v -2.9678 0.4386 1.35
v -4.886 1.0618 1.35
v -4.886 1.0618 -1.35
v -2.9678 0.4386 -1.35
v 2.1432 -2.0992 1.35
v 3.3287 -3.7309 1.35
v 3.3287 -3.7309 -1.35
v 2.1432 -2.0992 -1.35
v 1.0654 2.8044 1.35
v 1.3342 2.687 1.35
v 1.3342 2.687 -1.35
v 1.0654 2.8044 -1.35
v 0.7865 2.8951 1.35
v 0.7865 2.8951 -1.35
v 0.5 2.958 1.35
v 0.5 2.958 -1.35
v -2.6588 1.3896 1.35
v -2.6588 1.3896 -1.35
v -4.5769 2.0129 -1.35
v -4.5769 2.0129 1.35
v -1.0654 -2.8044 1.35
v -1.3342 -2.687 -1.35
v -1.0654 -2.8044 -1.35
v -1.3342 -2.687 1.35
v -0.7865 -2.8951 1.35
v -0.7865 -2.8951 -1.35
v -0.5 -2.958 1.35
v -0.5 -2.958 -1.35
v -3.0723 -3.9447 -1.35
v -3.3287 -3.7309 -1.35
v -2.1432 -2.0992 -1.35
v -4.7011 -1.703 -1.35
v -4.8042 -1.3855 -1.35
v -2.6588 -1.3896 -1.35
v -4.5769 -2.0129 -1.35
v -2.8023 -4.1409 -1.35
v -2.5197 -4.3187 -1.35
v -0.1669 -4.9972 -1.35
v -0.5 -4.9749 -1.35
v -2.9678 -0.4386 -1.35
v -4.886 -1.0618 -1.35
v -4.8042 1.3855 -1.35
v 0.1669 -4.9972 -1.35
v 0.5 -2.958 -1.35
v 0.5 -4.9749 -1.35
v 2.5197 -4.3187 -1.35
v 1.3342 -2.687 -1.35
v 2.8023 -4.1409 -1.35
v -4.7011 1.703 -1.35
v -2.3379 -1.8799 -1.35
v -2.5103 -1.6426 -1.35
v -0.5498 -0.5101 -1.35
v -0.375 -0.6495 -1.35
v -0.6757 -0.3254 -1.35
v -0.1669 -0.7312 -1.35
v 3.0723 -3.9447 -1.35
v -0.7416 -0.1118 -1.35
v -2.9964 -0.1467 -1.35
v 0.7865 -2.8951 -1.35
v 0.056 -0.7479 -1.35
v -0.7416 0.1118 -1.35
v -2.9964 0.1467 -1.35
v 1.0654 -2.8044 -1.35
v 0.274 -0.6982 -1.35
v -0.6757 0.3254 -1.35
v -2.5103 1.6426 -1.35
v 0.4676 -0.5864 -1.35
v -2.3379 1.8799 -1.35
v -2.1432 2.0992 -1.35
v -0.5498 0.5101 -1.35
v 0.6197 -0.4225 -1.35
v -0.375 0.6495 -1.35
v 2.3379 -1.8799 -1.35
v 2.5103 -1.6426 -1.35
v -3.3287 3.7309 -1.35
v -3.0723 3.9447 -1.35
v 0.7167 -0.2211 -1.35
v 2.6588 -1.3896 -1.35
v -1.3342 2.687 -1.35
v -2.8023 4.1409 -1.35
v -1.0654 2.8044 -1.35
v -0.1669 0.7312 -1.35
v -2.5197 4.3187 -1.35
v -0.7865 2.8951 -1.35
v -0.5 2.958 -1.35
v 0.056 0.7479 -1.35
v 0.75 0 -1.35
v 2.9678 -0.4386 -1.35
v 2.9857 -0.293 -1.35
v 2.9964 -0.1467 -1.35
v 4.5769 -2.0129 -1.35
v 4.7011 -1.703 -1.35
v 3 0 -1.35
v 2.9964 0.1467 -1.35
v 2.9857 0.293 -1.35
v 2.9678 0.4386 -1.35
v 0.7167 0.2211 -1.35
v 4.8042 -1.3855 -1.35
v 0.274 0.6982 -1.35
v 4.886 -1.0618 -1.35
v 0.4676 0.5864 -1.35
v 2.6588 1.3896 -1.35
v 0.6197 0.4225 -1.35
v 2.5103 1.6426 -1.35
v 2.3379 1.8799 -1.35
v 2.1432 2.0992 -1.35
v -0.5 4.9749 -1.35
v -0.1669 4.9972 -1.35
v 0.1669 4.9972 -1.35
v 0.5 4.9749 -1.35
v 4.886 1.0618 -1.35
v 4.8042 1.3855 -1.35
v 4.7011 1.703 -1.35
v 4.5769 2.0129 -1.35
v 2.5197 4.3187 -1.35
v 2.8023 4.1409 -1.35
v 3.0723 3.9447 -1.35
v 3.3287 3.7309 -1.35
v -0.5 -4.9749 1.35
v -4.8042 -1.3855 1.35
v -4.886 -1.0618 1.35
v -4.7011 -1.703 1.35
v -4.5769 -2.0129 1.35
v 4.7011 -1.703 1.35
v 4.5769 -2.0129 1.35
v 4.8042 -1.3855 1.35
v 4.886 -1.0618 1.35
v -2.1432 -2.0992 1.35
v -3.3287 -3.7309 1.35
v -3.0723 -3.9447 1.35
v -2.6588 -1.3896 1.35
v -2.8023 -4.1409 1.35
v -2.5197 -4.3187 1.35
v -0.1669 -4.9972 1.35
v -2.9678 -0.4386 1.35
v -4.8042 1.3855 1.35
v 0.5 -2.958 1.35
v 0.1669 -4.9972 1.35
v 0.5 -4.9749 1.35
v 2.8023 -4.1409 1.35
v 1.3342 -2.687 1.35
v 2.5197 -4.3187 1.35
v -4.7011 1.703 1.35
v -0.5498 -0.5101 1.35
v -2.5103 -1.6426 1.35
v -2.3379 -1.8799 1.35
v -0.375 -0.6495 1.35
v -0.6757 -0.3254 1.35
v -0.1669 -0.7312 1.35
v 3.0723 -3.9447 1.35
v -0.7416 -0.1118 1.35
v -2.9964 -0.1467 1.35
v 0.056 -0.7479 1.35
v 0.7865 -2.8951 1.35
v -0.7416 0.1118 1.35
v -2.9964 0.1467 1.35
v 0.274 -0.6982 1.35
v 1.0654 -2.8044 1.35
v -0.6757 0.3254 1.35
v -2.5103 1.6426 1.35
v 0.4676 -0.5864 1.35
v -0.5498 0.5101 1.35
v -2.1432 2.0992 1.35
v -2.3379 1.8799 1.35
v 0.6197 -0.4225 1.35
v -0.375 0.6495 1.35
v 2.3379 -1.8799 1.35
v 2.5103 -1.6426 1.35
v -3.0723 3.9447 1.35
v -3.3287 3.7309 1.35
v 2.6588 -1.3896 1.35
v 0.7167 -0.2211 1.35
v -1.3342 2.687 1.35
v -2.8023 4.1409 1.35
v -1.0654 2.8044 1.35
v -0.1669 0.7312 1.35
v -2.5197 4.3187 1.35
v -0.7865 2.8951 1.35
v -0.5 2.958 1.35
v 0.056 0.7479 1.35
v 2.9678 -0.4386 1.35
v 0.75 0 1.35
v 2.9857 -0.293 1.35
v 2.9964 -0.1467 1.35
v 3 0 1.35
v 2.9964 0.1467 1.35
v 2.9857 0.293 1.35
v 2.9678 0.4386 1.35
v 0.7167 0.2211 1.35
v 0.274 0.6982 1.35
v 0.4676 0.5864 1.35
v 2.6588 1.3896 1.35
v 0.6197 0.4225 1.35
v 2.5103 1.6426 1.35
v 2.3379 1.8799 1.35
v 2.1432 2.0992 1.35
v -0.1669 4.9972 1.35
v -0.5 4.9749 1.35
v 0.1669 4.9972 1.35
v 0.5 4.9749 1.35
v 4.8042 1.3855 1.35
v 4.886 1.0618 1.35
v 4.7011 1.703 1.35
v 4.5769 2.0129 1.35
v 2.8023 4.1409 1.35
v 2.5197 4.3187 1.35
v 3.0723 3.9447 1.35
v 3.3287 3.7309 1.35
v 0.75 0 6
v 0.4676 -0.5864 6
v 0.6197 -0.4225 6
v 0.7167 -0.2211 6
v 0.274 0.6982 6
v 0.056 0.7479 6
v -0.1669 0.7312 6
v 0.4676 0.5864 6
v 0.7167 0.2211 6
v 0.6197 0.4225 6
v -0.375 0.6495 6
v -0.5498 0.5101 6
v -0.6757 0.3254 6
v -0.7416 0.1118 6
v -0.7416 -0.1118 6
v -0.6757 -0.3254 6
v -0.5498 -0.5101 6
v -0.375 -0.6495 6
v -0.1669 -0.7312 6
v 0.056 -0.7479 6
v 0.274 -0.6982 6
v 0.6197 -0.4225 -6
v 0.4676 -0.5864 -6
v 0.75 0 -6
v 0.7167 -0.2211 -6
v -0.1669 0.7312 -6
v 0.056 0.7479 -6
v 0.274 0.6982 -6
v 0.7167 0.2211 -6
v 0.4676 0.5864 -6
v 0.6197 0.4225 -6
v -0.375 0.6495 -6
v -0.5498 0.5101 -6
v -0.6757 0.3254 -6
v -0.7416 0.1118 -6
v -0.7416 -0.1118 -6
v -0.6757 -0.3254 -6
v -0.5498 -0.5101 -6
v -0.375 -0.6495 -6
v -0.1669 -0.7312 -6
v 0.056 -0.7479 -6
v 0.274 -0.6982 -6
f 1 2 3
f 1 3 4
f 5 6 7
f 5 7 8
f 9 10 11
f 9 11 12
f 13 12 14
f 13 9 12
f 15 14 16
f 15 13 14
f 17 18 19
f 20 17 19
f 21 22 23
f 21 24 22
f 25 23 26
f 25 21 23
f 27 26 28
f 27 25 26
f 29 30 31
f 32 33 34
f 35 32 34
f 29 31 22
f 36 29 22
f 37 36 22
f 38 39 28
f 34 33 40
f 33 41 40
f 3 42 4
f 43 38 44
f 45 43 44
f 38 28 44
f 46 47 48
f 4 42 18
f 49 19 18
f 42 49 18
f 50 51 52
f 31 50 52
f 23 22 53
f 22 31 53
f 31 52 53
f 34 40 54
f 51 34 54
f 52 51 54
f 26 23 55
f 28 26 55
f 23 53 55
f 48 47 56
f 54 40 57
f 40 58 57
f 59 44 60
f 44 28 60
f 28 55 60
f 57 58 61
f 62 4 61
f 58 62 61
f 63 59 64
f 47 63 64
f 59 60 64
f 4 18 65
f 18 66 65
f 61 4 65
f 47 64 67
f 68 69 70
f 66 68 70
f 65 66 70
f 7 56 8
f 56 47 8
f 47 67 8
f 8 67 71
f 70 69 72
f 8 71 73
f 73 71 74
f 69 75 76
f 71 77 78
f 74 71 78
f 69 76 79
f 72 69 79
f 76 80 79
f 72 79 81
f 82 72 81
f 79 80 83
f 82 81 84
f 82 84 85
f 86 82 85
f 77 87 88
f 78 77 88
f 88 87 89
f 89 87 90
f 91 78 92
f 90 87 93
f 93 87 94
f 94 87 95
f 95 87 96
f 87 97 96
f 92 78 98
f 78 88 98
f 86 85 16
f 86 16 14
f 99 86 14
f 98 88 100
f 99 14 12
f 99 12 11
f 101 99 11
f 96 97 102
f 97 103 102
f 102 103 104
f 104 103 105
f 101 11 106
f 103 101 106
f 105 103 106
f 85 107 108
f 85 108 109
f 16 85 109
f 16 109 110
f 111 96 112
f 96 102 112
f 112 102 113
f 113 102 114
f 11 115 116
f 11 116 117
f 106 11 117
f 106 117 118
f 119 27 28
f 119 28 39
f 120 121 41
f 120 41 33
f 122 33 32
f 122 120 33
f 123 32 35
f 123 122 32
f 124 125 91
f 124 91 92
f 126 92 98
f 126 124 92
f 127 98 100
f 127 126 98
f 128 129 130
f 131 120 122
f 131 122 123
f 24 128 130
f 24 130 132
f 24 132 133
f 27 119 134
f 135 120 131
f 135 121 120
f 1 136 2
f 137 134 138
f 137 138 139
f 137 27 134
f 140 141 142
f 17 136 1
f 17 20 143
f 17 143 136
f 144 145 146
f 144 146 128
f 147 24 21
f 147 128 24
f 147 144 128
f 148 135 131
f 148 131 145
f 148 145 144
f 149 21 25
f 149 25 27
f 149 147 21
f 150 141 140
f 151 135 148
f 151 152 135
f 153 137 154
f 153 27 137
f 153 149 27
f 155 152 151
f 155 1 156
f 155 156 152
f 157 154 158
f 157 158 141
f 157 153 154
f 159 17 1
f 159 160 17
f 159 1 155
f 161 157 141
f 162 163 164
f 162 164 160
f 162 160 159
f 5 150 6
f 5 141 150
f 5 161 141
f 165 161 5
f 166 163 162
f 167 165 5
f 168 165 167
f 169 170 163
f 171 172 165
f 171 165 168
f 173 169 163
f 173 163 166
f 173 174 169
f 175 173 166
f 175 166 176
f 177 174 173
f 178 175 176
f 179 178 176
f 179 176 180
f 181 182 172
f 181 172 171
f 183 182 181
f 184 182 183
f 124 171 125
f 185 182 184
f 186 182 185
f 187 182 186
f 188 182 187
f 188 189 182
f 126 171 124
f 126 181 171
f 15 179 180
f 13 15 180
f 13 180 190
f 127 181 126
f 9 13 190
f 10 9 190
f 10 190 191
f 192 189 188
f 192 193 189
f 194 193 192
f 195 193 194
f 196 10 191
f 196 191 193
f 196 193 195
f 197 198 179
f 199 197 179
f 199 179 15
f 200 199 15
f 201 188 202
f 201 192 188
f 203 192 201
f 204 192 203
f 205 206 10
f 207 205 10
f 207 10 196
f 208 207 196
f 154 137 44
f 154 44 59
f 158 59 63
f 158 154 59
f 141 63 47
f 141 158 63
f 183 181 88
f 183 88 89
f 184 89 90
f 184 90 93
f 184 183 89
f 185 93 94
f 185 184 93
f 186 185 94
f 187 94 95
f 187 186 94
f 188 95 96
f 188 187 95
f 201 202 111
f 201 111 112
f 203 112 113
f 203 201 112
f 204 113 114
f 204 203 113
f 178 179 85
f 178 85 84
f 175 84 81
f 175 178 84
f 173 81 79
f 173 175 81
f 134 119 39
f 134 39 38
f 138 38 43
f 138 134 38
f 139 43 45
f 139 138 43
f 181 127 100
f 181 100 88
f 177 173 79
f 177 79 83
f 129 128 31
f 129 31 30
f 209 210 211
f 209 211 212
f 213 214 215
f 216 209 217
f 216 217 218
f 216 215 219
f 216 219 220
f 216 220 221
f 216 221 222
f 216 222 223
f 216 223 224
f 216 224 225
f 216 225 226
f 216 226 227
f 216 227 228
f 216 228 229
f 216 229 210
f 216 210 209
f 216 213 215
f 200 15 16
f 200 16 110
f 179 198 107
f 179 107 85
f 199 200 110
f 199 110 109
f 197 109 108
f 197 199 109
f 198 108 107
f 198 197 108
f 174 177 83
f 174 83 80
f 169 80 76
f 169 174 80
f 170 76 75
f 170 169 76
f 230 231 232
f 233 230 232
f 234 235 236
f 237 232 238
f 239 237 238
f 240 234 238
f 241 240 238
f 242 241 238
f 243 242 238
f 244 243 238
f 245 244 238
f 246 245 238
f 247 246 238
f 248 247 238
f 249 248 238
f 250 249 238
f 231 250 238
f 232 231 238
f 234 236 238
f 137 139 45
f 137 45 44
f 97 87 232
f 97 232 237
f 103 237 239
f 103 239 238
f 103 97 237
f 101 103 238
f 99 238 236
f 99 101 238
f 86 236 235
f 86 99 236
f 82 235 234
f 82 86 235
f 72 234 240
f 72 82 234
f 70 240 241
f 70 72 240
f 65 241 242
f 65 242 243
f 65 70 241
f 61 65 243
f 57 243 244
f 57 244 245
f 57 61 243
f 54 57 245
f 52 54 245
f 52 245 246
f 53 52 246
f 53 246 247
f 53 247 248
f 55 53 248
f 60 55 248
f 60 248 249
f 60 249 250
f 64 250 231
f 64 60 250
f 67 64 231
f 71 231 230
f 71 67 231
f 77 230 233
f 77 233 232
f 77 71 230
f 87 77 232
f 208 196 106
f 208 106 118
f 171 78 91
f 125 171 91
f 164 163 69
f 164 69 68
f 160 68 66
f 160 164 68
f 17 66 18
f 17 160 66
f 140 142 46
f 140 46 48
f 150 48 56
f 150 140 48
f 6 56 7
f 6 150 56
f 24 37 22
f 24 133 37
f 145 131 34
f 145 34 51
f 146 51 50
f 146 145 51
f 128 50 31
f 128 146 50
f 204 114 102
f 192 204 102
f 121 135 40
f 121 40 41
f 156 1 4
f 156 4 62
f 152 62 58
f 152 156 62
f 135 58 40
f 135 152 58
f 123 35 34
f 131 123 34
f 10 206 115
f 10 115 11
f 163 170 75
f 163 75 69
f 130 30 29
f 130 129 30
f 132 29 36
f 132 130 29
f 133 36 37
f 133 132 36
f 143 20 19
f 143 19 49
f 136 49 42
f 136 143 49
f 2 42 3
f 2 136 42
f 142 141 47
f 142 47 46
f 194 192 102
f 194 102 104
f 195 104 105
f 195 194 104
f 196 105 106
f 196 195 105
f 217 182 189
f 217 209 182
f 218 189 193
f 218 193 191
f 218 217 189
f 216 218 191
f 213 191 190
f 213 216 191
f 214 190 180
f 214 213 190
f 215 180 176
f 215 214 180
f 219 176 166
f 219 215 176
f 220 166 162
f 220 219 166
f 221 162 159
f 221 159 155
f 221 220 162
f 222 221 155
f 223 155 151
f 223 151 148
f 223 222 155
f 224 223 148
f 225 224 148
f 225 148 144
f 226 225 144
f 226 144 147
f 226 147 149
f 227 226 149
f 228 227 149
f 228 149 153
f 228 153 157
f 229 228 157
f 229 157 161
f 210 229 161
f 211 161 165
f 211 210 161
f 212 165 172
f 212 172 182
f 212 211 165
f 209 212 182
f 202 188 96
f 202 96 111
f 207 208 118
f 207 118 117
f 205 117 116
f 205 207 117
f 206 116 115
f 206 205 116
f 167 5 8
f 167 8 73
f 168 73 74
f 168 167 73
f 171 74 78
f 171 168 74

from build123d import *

# Parameters (mm, degrees)
F1_DEPTH = 1.35
F2_R     = 0.75
F3_DEPTH = 6


with BuildPart() as f1:
    # F0 (on Top) → F1 (new body, symmetric)
    with BuildSketch(Plane.XY):
        with BuildLine():
            ThreePointArc((-2.9677716115, -0.4385563384), (-2.8531695489, -0.9270509831), (-2.6587546171, -1.3896128547))
            Line((-2.6587546171, -1.3896128547), (-1.3090169944, -0.9510565163))
            Line((-1.3090169944, -0.9510565163), (-0.8090169944, -0.2628655561))
            Line((-0.8090169944, -0.2628655561), (-1.6180339887, 0))
            Line((-1.6180339887, 0), (-2.9677716115, -0.4385563384))
        make_face()
        with BuildLine():
            ThreePointArc((2.1432007211, -2.0992119162), (2.4270509831, -1.7633557569), (2.6587546171, -1.3896128547))
            Line((2.6587546171, -1.3896128547), (1.3090169944, -0.9510565163))
            Line((1.3090169944, -0.9510565163), (2.1432007211, -2.0992119162))
        make_face()
        with BuildLine():
            ThreePointArc((-2.1432007211, -2.0992119162), (-1.7633557569, -2.4270509831), (-1.3341837268, -2.6869971684))
            Line((-1.3341837268, -2.6869971684), (-0.5, -1.5388417686))
            Line((-0.5, -1.5388417686), (-0.5, -0.6881909602))
            Line((-0.5, -0.6881909602), (-1.3090169944, -0.9510565163))
            Line((-1.3090169944, -0.9510565163), (-2.1432007211, -2.0992119162))
        make_face()
        Polygon((0.6180339887, 0), (0.8090169944, 0.2628655561), (0.5, 0.363271264), (0.5, 0.1624598481), align=None)
        with BuildLine():
            ThreePointArc((0.5, -2.9580398915), (0.9270509831, -2.8531695489), (1.3341837268, -2.6869971684))
            Line((1.3341837268, -2.6869971684), (0.5, -1.5388417686))
            Line((0.5, -1.5388417686), (0.5, -2.9580398915))
        make_face()
        with BuildLine():
            ThreePointArc((0.4045084972, -0.2938926261), (0.4755282581, -0.1545084972), (0.5, 0))
            Line((0.5, 0), (-0.5, 0))
            ThreePointArc((-0.5, 0), (-0.4755282581, -0.1545084972), (-0.4045084972, -0.2938926261))
            ThreePointArc((-0.4045084972, -0.2938926261), (-0.2938926261, -0.4045084972), (-0.1545084972, -0.4755282581))
            ThreePointArc((-0.1545084972, -0.4755282581), (0, -0.5), (0.1545084972, -0.4755282581))
            ThreePointArc((0.1545084972, -0.4755282581), (0.2938926261, -0.4045084972), (0.4045084972, -0.2938926261))
        make_face()
        Polygon((-0.6180339887, 0), (-0.5, 0.1624598481), (-0.5, 0.363271264), (-0.8090169944, 0.2628655561), align=None)
        Polygon((0.5, -0.6881909602), (0.5, -0.363271264), (0.3090169944, -0.4253254042), (0.1909830056, -0.5877852523), align=None)
        with BuildLine():
            Line((-0.5, 1.5388417686), (-0.5, 2.9580398915))
            ThreePointArc((-0.5, 2.9580398915), (-0.9270509831, 2.8531695489), (-1.3341837268, 2.6869971684))
            Line((-1.3341837268, 2.6869971684), (-0.5, 1.5388417686))
        make_face()
        with BuildLine():
            Line((0.5, 1.5388417686), (1.3341837268, 2.6869971684))
            ThreePointArc((1.3341837268, 2.6869971684), (0.9270509831, 2.8531695489), (0.5, 2.9580398915))
            Line((0.5, 2.9580398915), (0.5, 1.5388417686))
        make_face()
        with BuildLine():
            Line((1.3090169944, 0.9510565163), (2.6587546171, 1.3896128547))
            ThreePointArc((2.6587546171, 1.3896128547), (2.4270509831, 1.7633557569), (2.1432007211, 2.0992119162))
            Line((2.1432007211, 2.0992119162), (1.3090169944, 0.9510565163))
        make_face()
        Polygon((0.8090169944, 0.2628655561), (1.3090169944, 0.9510565163), (0.5, 0.6881909602), (0.5, 0.363271264), align=None)
        Polygon((-0.5, -0.6881909602), (-0.1909830056, -0.5877852523), (-0.3090169944, -0.4253254042), (-0.5, -0.363271264), align=None)
        with BuildLine():
            Line((-1.3090169944, 0.9510565163), (-2.6587546171, 1.3896128547))
            ThreePointArc((-2.6587546171, 1.3896128547), (-2.8531695489, 0.9270509831), (-2.9677716115, 0.4385563384))
            Line((-2.9677716115, 0.4385563384), (-1.6180339887, 0))
            Line((-1.6180339887, 0), (-0.8090169944, 0.2628655561))
            Line((-0.8090169944, 0.2628655561), (-1.3090169944, 0.9510565163))
        make_face()
        with BuildLine():
            Line((-1.6180339887, 0), (-2.9677716115, 0.4385563384))
            ThreePointArc((-2.9677716115, 0.4385563384), (-3, 0), (-2.9677716115, -0.4385563384))
            Line((-2.9677716115, -0.4385563384), (-1.6180339887, 0))
        make_face()
        with BuildLine():
            ThreePointArc((-1.3341837268, -2.6869971684), (-0.9270509831, -2.8531695489), (-0.5, -2.9580398915))
            Line((-0.5, -2.9580398915), (-0.5, -1.5388417686))
            Line((-0.5, -1.5388417686), (-1.3341837268, -2.6869971684))
        make_face()
        with BuildLine():
            Line((-1.3090169944, 0.9510565163), (-2.1432007211, 2.0992119162))
            ThreePointArc((-2.1432007211, 2.0992119162), (-2.4270509831, 1.7633557569), (-2.6587546171, 1.3896128547))
            Line((-2.6587546171, 1.3896128547), (-1.3090169944, 0.9510565163))
        make_face()
        with BuildLine():
            ThreePointArc((-2.6587546171, -1.3896128547), (-2.4270509831, -1.7633557569), (-2.1432007211, -2.0992119162))
            Line((-2.1432007211, -2.0992119162), (-1.3090169944, -0.9510565163))
            Line((-1.3090169944, -0.9510565163), (-2.6587546171, -1.3896128547))
        make_face()
        Polygon((-0.3090169944, 0.4253254042), (-0.1909830056, 0.5877852523), (-0.5, 0.6881909602), (-0.5, 0.363271264), align=None)
        Polygon((0.5, -1.5388417686), (0.5, -0.6881909602), (0.1909830056, -0.5877852523), (0, -0.8506508084), align=None)
        with BuildLine():
            Line((-0.5, 0), (0.5, 0))
            ThreePointArc((0.5, 0), (0.4755282581, 0.1545084972), (0.4045084972, 0.2938926261))
            ThreePointArc((0.4045084972, 0.2938926261), (0.2938926261, 0.4045084972), (0.1545084972, 0.4755282581))
            ThreePointArc((0.1545084972, 0.4755282581), (0, 0.5), (-0.1545084972, 0.4755282581))
            ThreePointArc((-0.1545084972, 0.4755282581), (-0.2938926261, 0.4045084972), (-0.4045084972, 0.2938926261))
            ThreePointArc((-0.4045084972, 0.2938926261), (-0.4755282581, 0.1545084972), (-0.5, 0))
        make_face()
        with BuildLine():
            Line((1.6180339887, 0), (2.9677716115, 0.4385563384))
            ThreePointArc((2.9677716115, 0.4385563384), (2.8531695489, 0.9270509831), (2.6587546171, 1.3896128547))
            Line((2.6587546171, 1.3896128547), (1.3090169944, 0.9510565163))
            Line((1.3090169944, 0.9510565163), (0.8090169944, 0.2628655561))
            Line((0.8090169944, 0.2628655561), (1.6180339887, 0))
        make_face()
        Polygon((0.1909830056, 0.5877852523), (0.5, 0.6881909602), (0.5, 1.5388417686), (0, 0.8506508084), align=None)
        Polygon((-0.5, 0.363271264), (-0.5, 0.6881909602), (-1.3090169944, 0.9510565163), (-0.8090169944, 0.2628655561), align=None)
        with BuildLine():
            Line((0.5, 1.5388417686), (0.5, 2.9580398915))
            ThreePointArc((0.5, 2.9580398915), (0, 3), (-0.5, 2.9580398915))
            Line((-0.5, 2.9580398915), (-0.5, 1.5388417686))
            Line((-0.5, 1.5388417686), (0, 0.8506508084))
            Line((0, 0.8506508084), (0.5, 1.5388417686))
        make_face()
        with BuildLine():
            ThreePointArc((2.6587546171, -1.3896128547), (2.8531695489, -0.9270509831), (2.9677716115, -0.4385563384))
            Line((2.9677716115, -0.4385563384), (1.6180339887, 0))
            Line((1.6180339887, 0), (0.8090169944, -0.2628655561))
            Line((0.8090169944, -0.2628655561), (1.3090169944, -0.9510565163))
            Line((1.3090169944, -0.9510565163), (2.6587546171, -1.3896128547))
        make_face()
        Polygon((-0.5, -0.363271264), (-0.5, -0.1624598481), (-0.6180339887, 0), (-0.8090169944, -0.2628655561), align=None)
        Polygon((0.8090169944, -0.2628655561), (1.6180339887, 0), (0.8090169944, 0.2628655561), (0.6180339887, 0), align=None)
        Polygon((-0.1909830056, 0.5877852523), (0, 0.8506508084), (-0.5, 1.5388417686), (-0.5, 0.6881909602), align=None)
        Polygon((0, -0.8506508084), (0.1909830056, -0.5877852523), (0, -0.5257311121), (-0.1909830056, -0.5877852523), align=None)
        Polygon((0, 0.5257311121), (0.1909830056, 0.5877852523), (0, 0.8506508084), (-0.1909830056, 0.5877852523), align=None)
        with BuildLine():
            ThreePointArc((1.3341837268, -2.6869971684), (1.7633557569, -2.4270509831), (2.1432007211, -2.0992119162))
            Line((2.1432007211, -2.0992119162), (1.3090169944, -0.9510565163))
            Line((1.3090169944, -0.9510565163), (0.5, -0.6881909602))
            Line((0.5, -0.6881909602), (0.5, -1.5388417686))
            Line((0.5, -1.5388417686), (1.3341837268, -2.6869971684))
        make_face()
        with BuildLine():
            Line((1.3090169944, 0.9510565163), (2.1432007211, 2.0992119162))
            ThreePointArc((2.1432007211, 2.0992119162), (1.7633557569, 2.4270509831), (1.3341837268, 2.6869971684))
            Line((1.3341837268, 2.6869971684), (0.5, 1.5388417686))
            Line((0.5, 1.5388417686), (0.5, 0.6881909602))
            Line((0.5, 0.6881909602), (1.3090169944, 0.9510565163))
        make_face()
        Polygon((-0.8090169944, -0.2628655561), (-0.6180339887, 0), (-0.8090169944, 0.2628655561), (-1.6180339887, 0), align=None)
        Polygon((0.5, -0.363271264), (0.8090169944, -0.2628655561), (0.6180339887, 0), (0.5, -0.1624598481), align=None)
        Polygon((-0.5, -1.5388417686), (0, -0.8506508084), (-0.1909830056, -0.5877852523), (-0.5, -0.6881909602), align=None)
        with BuildLine():
            ThreePointArc((-0.5, -2.9580398915), (0, -3), (0.5, -2.9580398915))
            Line((0.5, -2.9580398915), (0.5, -1.5388417686))
            Line((0.5, -1.5388417686), (0, -0.8506508084))
            Line((0, -0.8506508084), (-0.5, -1.5388417686))
            Line((-0.5, -1.5388417686), (-0.5, -2.9580398915))
        make_face()
        with BuildLine():
            ThreePointArc((2.9677716115, -0.4385563384), (2.9919320543, -0.2198694675), (3, 0))
            ThreePointArc((3, 0), (2.9919320543, 0.2198694675), (2.9677716115, 0.4385563384))
            Line((2.9677716115, 0.4385563384), (1.6180339887, 0))
            Line((1.6180339887, 0), (2.9677716115, -0.4385563384))
        make_face()
        Polygon((1.3090169944, -0.9510565163), (0.8090169944, -0.2628655561), (0.5, -0.363271264), (0.5, -0.6881909602), align=None)
        Polygon((0.5, 0.363271264), (0.5, 0.6881909602), (0.1909830056, 0.5877852523), (0.3090169944, 0.4253254042), align=None)
        with BuildLine():
            Line((-0.5, 1.5388417686), (-1.3341837268, 2.6869971684))
            ThreePointArc((-1.3341837268, 2.6869971684), (-1.7633557569, 2.4270509831), (-2.1432007211, 2.0992119162))
            Line((-2.1432007211, 2.0992119162), (-1.3090169944, 0.9510565163))
            Line((-1.3090169944, 0.9510565163), (-0.5, 0.6881909602))
            Line((-0.5, 0.6881909602), (-0.5, 1.5388417686))
        make_face()
        Polygon((-1.3090169944, -0.9510565163), (-0.5, -0.6881909602), (-0.5, -0.363271264), (-0.8090169944, -0.2628655561), align=None)
        Polygon((-0.1909830056, -0.5877852523), (0, -0.5257311121), (-0.1545084972, -0.4755282581), (-0.3090169944, -0.4253254042), align=None)
        Polygon((0.3090169944, -0.4253254042), (0.5, -0.363271264), (0.5, -0.1624598481), (0.4045084972, -0.2938926261), align=None)
        Polygon((-0.1545084972, 0.4755282581), (0, 0.5257311121), (-0.1909830056, 0.5877852523), (-0.3090169944, 0.4253254042), align=None)
        Polygon((-0.4045084972, -0.2938926261), (-0.5, -0.1624598481), (-0.5, -0.363271264), (-0.3090169944, -0.4253254042), align=None)
        Polygon((0.3090169944, 0.4253254042), (0.1909830056, 0.5877852523), (0, 0.5257311121), (0.1545084972, 0.4755282581), align=None)
        Polygon((0.1909830056, -0.5877852523), (0.3090169944, -0.4253254042), (0.1545084972, -0.4755282581), (0, -0.5257311121), align=None)
        with BuildLine():
            Line((-0.5, 0.1624598481), (-0.5, 0))
            ThreePointArc((-0.5, 0), (-0.4755282581, 0.1545084972), (-0.4045084972, 0.2938926261))
            Line((-0.4045084972, 0.2938926261), (-0.5, 0.1624598481))
        make_face()
        Polygon((0.5, -0.1624598481), (0.6180339887, 0), (0.5, 0.1624598481), (0.5, 0), align=None)
        Polygon((0.5, 0.1624598481), (0.5, 0.363271264), (0.3090169944, 0.4253254042), (0.4045084972, 0.2938926261), align=None)
        with BuildLine():
            Line((-0.3090169944, -0.4253254042), (-0.1545084972, -0.4755282581))
            ThreePointArc((-0.1545084972, -0.4755282581), (-0.2938926261, -0.4045084972), (-0.4045084972, -0.2938926261))
            Line((-0.4045084972, -0.2938926261), (-0.3090169944, -0.4253254042))
        make_face()
        Polygon((-0.4045084972, 0.2938926261), (-0.3090169944, 0.4253254042), (-0.5, 0.363271264), (-0.5, 0.1624598481), align=None)
        with BuildLine():
            Line((0.4045084972, 0.2938926261), (0.3090169944, 0.4253254042))
            Line((0.3090169944, 0.4253254042), (0.1545084972, 0.4755282581))
            ThreePointArc((0.1545084972, 0.4755282581), (0.2938926261, 0.4045084972), (0.4045084972, 0.2938926261))
        make_face()
        with BuildLine():
            ThreePointArc((-0.4045084972, -0.2938926261), (-0.4755282581, -0.1545084972), (-0.5, 0))
            Line((-0.5, 0), (-0.5, -0.1624598481))
            Line((-0.5, -0.1624598481), (-0.4045084972, -0.2938926261))
        make_face()
        with BuildLine():
            Line((0.1545084972, -0.4755282581), (0.3090169944, -0.4253254042))
            Line((0.3090169944, -0.4253254042), (0.4045084972, -0.2938926261))
            ThreePointArc((0.4045084972, -0.2938926261), (0.2938926261, -0.4045084972), (0.1545084972, -0.4755282581))
        make_face()
        with BuildLine():
            ThreePointArc((-0.4045084972, 0.2938926261), (-0.2938926261, 0.4045084972), (-0.1545084972, 0.4755282581))
            Line((-0.1545084972, 0.4755282581), (-0.3090169944, 0.4253254042))
            Line((-0.3090169944, 0.4253254042), (-0.4045084972, 0.2938926261))
        make_face()
        with BuildLine():
            Line((0.4045084972, -0.2938926261), (0.5, -0.1624598481))
            Line((0.5, -0.1624598481), (0.5, 0))
            ThreePointArc((0.5, 0), (0.4755282581, -0.1545084972), (0.4045084972, -0.2938926261))
        make_face()
        with BuildLine():
            Line((0.5, 0), (0.5, 0.1624598481))
            Line((0.5, 0.1624598481), (0.4045084972, 0.2938926261))
            ThreePointArc((0.4045084972, 0.2938926261), (0.4755282581, 0.1545084972), (0.5, 0))
        make_face()
        with BuildLine():
            Line((0, -0.5257311121), (0.1545084972, -0.4755282581))
            ThreePointArc((0.1545084972, -0.4755282581), (0, -0.5), (-0.1545084972, -0.4755282581))
            Line((-0.1545084972, -0.4755282581), (0, -0.5257311121))
        make_face()
        with BuildLine():
            Line((0.1545084972, 0.4755282581), (0, 0.5257311121))
            Line((0, 0.5257311121), (-0.1545084972, 0.4755282581))
            ThreePointArc((-0.1545084972, 0.4755282581), (0, 0.5), (0.1545084972, 0.4755282581))
        make_face()
        Polygon((-0.5, -0.1624598481), (-0.5, 0), (-0.5, 0.1624598481), (-0.6180339887, 0), align=None)
        with BuildLine():
            ThreePointArc((-2.1432007211, 2.0992119162), (-1.7633557569, 2.4270509831), (-1.3341837268, 2.6869971684))
            Line((-1.3341837268, 2.6869971684), (-2.5196862116, 4.3187013552))
            ThreePointArc((-2.5196862116, 4.3187013552), (-2.9389262615, 4.0450849719), (-3.3287032059, 3.7309161029))
            Line((-3.3287032059, 3.7309161029), (-2.1432007211, 2.0992119162))
        make_face()
        with BuildLine():
            ThreePointArc((-0.5, 2.9580398915), (0, 3), (0.5, 2.9580398915))
            Line((0.5, 2.9580398915), (0.5, 4.9749371855))
            ThreePointArc((0.5, 4.9749371855), (0, 5), (-0.5, 4.9749371855))
            Line((-0.5, 4.9749371855), (-0.5, 2.9580398915))
        make_face()
        with BuildLine():
            ThreePointArc((1.3341837268, 2.6869971684), (1.7633557569, 2.4270509831), (2.1432007211, 2.0992119162))
            Line((2.1432007211, 2.0992119162), (3.3287032059, 3.7309161029))
            ThreePointArc((3.3287032059, 3.7309161029), (2.9389262615, 4.0450849719), (2.5196862116, 4.3187013552))
            Line((2.5196862116, 4.3187013552), (1.3341837268, 2.6869971684))
        make_face()
        with BuildLine():
            ThreePointArc((2.6587546171, 1.3896128547), (2.8531695489, 0.9270509831), (2.9677716115, 0.4385563384))
            Line((2.9677716115, 0.4385563384), (4.8859549256, 1.0618118781))
            ThreePointArc((4.8859549256, 1.0618118781), (4.7552825815, 1.5450849719), (4.5769379313, 2.0128683944))
            Line((4.5769379313, 2.0128683944), (2.6587546171, 1.3896128547))
        make_face()
        with BuildLine():
            Line((3.3287032059, -3.7309161029), (2.1432007211, -2.0992119162))
            ThreePointArc((2.1432007211, -2.0992119162), (1.7633557569, -2.4270509831), (1.3341837268, -2.6869971684))
            Line((1.3341837268, -2.6869971684), (2.5196862116, -4.3187013552))
            ThreePointArc((2.5196862116, -4.3187013552), (2.9389262615, -4.0450849719), (3.3287032059, -3.7309161029))
        make_face()
        with BuildLine():
            Line((4.8859549256, -1.0618118781), (2.9677716115, -0.4385563384))
            ThreePointArc((2.9677716115, -0.4385563384), (2.8531695489, -0.9270509831), (2.6587546171, -1.3896128547))
            Line((2.6587546171, -1.3896128547), (4.5769379313, -2.0128683944))
            ThreePointArc((4.5769379313, -2.0128683944), (4.7552825815, -1.5450849719), (4.8859549256, -1.0618118781))
        make_face()
        with BuildLine():
            Line((0.5, -4.9749371855), (0.5, -2.9580398915))
            ThreePointArc((0.5, -2.9580398915), (0, -3), (-0.5, -2.9580398915))
            Line((-0.5, -2.9580398915), (-0.5, -4.9749371855))
            ThreePointArc((-0.5, -4.9749371855), (0, -5), (0.5, -4.9749371855))
        make_face()
        with BuildLine():
            Line((-2.5196862116, -4.3187013552), (-1.3341837268, -2.6869971684))
            ThreePointArc((-1.3341837268, -2.6869971684), (-1.7633557569, -2.4270509831), (-2.1432007211, -2.0992119162))
            Line((-2.1432007211, -2.0992119162), (-3.3287032059, -3.7309161029))
            ThreePointArc((-3.3287032059, -3.7309161029), (-2.9389262615, -4.0450849719), (-2.5196862116, -4.3187013552))
        make_face()
        with BuildLine():
            Line((-4.5769379313, -2.0128683944), (-2.6587546171, -1.3896128547))
            ThreePointArc((-2.6587546171, -1.3896128547), (-2.8531695489, -0.9270509831), (-2.9677716115, -0.4385563384))
            Line((-2.9677716115, -0.4385563384), (-4.8859549256, -1.0618118781))
            ThreePointArc((-4.8859549256, -1.0618118781), (-4.7552825815, -1.5450849719), (-4.5769379313, -2.0128683944))
        make_face()
        with BuildLine():
            ThreePointArc((-2.9677716115, 0.4385563384), (-2.8531695489, 0.9270509831), (-2.6587546171, 1.3896128547))
            Line((-2.6587546171, 1.3896128547), (-4.5769379313, 2.0128683944))
            ThreePointArc((-4.5769379313, 2.0128683944), (-4.7552825815, 1.5450849719), (-4.8859549256, 1.0618118781))
            Line((-4.8859549256, 1.0618118781), (-2.9677716115, 0.4385563384))
        make_face()
    extrude(amount=F1_DEPTH, both=True)

    # F2 (on Top) → F3 (join, symmetric)
    with BuildSketch(Plane.XY):
        Circle(F2_R)
    extrude(amount=F3_DEPTH, both=True)


solid = f1.part
